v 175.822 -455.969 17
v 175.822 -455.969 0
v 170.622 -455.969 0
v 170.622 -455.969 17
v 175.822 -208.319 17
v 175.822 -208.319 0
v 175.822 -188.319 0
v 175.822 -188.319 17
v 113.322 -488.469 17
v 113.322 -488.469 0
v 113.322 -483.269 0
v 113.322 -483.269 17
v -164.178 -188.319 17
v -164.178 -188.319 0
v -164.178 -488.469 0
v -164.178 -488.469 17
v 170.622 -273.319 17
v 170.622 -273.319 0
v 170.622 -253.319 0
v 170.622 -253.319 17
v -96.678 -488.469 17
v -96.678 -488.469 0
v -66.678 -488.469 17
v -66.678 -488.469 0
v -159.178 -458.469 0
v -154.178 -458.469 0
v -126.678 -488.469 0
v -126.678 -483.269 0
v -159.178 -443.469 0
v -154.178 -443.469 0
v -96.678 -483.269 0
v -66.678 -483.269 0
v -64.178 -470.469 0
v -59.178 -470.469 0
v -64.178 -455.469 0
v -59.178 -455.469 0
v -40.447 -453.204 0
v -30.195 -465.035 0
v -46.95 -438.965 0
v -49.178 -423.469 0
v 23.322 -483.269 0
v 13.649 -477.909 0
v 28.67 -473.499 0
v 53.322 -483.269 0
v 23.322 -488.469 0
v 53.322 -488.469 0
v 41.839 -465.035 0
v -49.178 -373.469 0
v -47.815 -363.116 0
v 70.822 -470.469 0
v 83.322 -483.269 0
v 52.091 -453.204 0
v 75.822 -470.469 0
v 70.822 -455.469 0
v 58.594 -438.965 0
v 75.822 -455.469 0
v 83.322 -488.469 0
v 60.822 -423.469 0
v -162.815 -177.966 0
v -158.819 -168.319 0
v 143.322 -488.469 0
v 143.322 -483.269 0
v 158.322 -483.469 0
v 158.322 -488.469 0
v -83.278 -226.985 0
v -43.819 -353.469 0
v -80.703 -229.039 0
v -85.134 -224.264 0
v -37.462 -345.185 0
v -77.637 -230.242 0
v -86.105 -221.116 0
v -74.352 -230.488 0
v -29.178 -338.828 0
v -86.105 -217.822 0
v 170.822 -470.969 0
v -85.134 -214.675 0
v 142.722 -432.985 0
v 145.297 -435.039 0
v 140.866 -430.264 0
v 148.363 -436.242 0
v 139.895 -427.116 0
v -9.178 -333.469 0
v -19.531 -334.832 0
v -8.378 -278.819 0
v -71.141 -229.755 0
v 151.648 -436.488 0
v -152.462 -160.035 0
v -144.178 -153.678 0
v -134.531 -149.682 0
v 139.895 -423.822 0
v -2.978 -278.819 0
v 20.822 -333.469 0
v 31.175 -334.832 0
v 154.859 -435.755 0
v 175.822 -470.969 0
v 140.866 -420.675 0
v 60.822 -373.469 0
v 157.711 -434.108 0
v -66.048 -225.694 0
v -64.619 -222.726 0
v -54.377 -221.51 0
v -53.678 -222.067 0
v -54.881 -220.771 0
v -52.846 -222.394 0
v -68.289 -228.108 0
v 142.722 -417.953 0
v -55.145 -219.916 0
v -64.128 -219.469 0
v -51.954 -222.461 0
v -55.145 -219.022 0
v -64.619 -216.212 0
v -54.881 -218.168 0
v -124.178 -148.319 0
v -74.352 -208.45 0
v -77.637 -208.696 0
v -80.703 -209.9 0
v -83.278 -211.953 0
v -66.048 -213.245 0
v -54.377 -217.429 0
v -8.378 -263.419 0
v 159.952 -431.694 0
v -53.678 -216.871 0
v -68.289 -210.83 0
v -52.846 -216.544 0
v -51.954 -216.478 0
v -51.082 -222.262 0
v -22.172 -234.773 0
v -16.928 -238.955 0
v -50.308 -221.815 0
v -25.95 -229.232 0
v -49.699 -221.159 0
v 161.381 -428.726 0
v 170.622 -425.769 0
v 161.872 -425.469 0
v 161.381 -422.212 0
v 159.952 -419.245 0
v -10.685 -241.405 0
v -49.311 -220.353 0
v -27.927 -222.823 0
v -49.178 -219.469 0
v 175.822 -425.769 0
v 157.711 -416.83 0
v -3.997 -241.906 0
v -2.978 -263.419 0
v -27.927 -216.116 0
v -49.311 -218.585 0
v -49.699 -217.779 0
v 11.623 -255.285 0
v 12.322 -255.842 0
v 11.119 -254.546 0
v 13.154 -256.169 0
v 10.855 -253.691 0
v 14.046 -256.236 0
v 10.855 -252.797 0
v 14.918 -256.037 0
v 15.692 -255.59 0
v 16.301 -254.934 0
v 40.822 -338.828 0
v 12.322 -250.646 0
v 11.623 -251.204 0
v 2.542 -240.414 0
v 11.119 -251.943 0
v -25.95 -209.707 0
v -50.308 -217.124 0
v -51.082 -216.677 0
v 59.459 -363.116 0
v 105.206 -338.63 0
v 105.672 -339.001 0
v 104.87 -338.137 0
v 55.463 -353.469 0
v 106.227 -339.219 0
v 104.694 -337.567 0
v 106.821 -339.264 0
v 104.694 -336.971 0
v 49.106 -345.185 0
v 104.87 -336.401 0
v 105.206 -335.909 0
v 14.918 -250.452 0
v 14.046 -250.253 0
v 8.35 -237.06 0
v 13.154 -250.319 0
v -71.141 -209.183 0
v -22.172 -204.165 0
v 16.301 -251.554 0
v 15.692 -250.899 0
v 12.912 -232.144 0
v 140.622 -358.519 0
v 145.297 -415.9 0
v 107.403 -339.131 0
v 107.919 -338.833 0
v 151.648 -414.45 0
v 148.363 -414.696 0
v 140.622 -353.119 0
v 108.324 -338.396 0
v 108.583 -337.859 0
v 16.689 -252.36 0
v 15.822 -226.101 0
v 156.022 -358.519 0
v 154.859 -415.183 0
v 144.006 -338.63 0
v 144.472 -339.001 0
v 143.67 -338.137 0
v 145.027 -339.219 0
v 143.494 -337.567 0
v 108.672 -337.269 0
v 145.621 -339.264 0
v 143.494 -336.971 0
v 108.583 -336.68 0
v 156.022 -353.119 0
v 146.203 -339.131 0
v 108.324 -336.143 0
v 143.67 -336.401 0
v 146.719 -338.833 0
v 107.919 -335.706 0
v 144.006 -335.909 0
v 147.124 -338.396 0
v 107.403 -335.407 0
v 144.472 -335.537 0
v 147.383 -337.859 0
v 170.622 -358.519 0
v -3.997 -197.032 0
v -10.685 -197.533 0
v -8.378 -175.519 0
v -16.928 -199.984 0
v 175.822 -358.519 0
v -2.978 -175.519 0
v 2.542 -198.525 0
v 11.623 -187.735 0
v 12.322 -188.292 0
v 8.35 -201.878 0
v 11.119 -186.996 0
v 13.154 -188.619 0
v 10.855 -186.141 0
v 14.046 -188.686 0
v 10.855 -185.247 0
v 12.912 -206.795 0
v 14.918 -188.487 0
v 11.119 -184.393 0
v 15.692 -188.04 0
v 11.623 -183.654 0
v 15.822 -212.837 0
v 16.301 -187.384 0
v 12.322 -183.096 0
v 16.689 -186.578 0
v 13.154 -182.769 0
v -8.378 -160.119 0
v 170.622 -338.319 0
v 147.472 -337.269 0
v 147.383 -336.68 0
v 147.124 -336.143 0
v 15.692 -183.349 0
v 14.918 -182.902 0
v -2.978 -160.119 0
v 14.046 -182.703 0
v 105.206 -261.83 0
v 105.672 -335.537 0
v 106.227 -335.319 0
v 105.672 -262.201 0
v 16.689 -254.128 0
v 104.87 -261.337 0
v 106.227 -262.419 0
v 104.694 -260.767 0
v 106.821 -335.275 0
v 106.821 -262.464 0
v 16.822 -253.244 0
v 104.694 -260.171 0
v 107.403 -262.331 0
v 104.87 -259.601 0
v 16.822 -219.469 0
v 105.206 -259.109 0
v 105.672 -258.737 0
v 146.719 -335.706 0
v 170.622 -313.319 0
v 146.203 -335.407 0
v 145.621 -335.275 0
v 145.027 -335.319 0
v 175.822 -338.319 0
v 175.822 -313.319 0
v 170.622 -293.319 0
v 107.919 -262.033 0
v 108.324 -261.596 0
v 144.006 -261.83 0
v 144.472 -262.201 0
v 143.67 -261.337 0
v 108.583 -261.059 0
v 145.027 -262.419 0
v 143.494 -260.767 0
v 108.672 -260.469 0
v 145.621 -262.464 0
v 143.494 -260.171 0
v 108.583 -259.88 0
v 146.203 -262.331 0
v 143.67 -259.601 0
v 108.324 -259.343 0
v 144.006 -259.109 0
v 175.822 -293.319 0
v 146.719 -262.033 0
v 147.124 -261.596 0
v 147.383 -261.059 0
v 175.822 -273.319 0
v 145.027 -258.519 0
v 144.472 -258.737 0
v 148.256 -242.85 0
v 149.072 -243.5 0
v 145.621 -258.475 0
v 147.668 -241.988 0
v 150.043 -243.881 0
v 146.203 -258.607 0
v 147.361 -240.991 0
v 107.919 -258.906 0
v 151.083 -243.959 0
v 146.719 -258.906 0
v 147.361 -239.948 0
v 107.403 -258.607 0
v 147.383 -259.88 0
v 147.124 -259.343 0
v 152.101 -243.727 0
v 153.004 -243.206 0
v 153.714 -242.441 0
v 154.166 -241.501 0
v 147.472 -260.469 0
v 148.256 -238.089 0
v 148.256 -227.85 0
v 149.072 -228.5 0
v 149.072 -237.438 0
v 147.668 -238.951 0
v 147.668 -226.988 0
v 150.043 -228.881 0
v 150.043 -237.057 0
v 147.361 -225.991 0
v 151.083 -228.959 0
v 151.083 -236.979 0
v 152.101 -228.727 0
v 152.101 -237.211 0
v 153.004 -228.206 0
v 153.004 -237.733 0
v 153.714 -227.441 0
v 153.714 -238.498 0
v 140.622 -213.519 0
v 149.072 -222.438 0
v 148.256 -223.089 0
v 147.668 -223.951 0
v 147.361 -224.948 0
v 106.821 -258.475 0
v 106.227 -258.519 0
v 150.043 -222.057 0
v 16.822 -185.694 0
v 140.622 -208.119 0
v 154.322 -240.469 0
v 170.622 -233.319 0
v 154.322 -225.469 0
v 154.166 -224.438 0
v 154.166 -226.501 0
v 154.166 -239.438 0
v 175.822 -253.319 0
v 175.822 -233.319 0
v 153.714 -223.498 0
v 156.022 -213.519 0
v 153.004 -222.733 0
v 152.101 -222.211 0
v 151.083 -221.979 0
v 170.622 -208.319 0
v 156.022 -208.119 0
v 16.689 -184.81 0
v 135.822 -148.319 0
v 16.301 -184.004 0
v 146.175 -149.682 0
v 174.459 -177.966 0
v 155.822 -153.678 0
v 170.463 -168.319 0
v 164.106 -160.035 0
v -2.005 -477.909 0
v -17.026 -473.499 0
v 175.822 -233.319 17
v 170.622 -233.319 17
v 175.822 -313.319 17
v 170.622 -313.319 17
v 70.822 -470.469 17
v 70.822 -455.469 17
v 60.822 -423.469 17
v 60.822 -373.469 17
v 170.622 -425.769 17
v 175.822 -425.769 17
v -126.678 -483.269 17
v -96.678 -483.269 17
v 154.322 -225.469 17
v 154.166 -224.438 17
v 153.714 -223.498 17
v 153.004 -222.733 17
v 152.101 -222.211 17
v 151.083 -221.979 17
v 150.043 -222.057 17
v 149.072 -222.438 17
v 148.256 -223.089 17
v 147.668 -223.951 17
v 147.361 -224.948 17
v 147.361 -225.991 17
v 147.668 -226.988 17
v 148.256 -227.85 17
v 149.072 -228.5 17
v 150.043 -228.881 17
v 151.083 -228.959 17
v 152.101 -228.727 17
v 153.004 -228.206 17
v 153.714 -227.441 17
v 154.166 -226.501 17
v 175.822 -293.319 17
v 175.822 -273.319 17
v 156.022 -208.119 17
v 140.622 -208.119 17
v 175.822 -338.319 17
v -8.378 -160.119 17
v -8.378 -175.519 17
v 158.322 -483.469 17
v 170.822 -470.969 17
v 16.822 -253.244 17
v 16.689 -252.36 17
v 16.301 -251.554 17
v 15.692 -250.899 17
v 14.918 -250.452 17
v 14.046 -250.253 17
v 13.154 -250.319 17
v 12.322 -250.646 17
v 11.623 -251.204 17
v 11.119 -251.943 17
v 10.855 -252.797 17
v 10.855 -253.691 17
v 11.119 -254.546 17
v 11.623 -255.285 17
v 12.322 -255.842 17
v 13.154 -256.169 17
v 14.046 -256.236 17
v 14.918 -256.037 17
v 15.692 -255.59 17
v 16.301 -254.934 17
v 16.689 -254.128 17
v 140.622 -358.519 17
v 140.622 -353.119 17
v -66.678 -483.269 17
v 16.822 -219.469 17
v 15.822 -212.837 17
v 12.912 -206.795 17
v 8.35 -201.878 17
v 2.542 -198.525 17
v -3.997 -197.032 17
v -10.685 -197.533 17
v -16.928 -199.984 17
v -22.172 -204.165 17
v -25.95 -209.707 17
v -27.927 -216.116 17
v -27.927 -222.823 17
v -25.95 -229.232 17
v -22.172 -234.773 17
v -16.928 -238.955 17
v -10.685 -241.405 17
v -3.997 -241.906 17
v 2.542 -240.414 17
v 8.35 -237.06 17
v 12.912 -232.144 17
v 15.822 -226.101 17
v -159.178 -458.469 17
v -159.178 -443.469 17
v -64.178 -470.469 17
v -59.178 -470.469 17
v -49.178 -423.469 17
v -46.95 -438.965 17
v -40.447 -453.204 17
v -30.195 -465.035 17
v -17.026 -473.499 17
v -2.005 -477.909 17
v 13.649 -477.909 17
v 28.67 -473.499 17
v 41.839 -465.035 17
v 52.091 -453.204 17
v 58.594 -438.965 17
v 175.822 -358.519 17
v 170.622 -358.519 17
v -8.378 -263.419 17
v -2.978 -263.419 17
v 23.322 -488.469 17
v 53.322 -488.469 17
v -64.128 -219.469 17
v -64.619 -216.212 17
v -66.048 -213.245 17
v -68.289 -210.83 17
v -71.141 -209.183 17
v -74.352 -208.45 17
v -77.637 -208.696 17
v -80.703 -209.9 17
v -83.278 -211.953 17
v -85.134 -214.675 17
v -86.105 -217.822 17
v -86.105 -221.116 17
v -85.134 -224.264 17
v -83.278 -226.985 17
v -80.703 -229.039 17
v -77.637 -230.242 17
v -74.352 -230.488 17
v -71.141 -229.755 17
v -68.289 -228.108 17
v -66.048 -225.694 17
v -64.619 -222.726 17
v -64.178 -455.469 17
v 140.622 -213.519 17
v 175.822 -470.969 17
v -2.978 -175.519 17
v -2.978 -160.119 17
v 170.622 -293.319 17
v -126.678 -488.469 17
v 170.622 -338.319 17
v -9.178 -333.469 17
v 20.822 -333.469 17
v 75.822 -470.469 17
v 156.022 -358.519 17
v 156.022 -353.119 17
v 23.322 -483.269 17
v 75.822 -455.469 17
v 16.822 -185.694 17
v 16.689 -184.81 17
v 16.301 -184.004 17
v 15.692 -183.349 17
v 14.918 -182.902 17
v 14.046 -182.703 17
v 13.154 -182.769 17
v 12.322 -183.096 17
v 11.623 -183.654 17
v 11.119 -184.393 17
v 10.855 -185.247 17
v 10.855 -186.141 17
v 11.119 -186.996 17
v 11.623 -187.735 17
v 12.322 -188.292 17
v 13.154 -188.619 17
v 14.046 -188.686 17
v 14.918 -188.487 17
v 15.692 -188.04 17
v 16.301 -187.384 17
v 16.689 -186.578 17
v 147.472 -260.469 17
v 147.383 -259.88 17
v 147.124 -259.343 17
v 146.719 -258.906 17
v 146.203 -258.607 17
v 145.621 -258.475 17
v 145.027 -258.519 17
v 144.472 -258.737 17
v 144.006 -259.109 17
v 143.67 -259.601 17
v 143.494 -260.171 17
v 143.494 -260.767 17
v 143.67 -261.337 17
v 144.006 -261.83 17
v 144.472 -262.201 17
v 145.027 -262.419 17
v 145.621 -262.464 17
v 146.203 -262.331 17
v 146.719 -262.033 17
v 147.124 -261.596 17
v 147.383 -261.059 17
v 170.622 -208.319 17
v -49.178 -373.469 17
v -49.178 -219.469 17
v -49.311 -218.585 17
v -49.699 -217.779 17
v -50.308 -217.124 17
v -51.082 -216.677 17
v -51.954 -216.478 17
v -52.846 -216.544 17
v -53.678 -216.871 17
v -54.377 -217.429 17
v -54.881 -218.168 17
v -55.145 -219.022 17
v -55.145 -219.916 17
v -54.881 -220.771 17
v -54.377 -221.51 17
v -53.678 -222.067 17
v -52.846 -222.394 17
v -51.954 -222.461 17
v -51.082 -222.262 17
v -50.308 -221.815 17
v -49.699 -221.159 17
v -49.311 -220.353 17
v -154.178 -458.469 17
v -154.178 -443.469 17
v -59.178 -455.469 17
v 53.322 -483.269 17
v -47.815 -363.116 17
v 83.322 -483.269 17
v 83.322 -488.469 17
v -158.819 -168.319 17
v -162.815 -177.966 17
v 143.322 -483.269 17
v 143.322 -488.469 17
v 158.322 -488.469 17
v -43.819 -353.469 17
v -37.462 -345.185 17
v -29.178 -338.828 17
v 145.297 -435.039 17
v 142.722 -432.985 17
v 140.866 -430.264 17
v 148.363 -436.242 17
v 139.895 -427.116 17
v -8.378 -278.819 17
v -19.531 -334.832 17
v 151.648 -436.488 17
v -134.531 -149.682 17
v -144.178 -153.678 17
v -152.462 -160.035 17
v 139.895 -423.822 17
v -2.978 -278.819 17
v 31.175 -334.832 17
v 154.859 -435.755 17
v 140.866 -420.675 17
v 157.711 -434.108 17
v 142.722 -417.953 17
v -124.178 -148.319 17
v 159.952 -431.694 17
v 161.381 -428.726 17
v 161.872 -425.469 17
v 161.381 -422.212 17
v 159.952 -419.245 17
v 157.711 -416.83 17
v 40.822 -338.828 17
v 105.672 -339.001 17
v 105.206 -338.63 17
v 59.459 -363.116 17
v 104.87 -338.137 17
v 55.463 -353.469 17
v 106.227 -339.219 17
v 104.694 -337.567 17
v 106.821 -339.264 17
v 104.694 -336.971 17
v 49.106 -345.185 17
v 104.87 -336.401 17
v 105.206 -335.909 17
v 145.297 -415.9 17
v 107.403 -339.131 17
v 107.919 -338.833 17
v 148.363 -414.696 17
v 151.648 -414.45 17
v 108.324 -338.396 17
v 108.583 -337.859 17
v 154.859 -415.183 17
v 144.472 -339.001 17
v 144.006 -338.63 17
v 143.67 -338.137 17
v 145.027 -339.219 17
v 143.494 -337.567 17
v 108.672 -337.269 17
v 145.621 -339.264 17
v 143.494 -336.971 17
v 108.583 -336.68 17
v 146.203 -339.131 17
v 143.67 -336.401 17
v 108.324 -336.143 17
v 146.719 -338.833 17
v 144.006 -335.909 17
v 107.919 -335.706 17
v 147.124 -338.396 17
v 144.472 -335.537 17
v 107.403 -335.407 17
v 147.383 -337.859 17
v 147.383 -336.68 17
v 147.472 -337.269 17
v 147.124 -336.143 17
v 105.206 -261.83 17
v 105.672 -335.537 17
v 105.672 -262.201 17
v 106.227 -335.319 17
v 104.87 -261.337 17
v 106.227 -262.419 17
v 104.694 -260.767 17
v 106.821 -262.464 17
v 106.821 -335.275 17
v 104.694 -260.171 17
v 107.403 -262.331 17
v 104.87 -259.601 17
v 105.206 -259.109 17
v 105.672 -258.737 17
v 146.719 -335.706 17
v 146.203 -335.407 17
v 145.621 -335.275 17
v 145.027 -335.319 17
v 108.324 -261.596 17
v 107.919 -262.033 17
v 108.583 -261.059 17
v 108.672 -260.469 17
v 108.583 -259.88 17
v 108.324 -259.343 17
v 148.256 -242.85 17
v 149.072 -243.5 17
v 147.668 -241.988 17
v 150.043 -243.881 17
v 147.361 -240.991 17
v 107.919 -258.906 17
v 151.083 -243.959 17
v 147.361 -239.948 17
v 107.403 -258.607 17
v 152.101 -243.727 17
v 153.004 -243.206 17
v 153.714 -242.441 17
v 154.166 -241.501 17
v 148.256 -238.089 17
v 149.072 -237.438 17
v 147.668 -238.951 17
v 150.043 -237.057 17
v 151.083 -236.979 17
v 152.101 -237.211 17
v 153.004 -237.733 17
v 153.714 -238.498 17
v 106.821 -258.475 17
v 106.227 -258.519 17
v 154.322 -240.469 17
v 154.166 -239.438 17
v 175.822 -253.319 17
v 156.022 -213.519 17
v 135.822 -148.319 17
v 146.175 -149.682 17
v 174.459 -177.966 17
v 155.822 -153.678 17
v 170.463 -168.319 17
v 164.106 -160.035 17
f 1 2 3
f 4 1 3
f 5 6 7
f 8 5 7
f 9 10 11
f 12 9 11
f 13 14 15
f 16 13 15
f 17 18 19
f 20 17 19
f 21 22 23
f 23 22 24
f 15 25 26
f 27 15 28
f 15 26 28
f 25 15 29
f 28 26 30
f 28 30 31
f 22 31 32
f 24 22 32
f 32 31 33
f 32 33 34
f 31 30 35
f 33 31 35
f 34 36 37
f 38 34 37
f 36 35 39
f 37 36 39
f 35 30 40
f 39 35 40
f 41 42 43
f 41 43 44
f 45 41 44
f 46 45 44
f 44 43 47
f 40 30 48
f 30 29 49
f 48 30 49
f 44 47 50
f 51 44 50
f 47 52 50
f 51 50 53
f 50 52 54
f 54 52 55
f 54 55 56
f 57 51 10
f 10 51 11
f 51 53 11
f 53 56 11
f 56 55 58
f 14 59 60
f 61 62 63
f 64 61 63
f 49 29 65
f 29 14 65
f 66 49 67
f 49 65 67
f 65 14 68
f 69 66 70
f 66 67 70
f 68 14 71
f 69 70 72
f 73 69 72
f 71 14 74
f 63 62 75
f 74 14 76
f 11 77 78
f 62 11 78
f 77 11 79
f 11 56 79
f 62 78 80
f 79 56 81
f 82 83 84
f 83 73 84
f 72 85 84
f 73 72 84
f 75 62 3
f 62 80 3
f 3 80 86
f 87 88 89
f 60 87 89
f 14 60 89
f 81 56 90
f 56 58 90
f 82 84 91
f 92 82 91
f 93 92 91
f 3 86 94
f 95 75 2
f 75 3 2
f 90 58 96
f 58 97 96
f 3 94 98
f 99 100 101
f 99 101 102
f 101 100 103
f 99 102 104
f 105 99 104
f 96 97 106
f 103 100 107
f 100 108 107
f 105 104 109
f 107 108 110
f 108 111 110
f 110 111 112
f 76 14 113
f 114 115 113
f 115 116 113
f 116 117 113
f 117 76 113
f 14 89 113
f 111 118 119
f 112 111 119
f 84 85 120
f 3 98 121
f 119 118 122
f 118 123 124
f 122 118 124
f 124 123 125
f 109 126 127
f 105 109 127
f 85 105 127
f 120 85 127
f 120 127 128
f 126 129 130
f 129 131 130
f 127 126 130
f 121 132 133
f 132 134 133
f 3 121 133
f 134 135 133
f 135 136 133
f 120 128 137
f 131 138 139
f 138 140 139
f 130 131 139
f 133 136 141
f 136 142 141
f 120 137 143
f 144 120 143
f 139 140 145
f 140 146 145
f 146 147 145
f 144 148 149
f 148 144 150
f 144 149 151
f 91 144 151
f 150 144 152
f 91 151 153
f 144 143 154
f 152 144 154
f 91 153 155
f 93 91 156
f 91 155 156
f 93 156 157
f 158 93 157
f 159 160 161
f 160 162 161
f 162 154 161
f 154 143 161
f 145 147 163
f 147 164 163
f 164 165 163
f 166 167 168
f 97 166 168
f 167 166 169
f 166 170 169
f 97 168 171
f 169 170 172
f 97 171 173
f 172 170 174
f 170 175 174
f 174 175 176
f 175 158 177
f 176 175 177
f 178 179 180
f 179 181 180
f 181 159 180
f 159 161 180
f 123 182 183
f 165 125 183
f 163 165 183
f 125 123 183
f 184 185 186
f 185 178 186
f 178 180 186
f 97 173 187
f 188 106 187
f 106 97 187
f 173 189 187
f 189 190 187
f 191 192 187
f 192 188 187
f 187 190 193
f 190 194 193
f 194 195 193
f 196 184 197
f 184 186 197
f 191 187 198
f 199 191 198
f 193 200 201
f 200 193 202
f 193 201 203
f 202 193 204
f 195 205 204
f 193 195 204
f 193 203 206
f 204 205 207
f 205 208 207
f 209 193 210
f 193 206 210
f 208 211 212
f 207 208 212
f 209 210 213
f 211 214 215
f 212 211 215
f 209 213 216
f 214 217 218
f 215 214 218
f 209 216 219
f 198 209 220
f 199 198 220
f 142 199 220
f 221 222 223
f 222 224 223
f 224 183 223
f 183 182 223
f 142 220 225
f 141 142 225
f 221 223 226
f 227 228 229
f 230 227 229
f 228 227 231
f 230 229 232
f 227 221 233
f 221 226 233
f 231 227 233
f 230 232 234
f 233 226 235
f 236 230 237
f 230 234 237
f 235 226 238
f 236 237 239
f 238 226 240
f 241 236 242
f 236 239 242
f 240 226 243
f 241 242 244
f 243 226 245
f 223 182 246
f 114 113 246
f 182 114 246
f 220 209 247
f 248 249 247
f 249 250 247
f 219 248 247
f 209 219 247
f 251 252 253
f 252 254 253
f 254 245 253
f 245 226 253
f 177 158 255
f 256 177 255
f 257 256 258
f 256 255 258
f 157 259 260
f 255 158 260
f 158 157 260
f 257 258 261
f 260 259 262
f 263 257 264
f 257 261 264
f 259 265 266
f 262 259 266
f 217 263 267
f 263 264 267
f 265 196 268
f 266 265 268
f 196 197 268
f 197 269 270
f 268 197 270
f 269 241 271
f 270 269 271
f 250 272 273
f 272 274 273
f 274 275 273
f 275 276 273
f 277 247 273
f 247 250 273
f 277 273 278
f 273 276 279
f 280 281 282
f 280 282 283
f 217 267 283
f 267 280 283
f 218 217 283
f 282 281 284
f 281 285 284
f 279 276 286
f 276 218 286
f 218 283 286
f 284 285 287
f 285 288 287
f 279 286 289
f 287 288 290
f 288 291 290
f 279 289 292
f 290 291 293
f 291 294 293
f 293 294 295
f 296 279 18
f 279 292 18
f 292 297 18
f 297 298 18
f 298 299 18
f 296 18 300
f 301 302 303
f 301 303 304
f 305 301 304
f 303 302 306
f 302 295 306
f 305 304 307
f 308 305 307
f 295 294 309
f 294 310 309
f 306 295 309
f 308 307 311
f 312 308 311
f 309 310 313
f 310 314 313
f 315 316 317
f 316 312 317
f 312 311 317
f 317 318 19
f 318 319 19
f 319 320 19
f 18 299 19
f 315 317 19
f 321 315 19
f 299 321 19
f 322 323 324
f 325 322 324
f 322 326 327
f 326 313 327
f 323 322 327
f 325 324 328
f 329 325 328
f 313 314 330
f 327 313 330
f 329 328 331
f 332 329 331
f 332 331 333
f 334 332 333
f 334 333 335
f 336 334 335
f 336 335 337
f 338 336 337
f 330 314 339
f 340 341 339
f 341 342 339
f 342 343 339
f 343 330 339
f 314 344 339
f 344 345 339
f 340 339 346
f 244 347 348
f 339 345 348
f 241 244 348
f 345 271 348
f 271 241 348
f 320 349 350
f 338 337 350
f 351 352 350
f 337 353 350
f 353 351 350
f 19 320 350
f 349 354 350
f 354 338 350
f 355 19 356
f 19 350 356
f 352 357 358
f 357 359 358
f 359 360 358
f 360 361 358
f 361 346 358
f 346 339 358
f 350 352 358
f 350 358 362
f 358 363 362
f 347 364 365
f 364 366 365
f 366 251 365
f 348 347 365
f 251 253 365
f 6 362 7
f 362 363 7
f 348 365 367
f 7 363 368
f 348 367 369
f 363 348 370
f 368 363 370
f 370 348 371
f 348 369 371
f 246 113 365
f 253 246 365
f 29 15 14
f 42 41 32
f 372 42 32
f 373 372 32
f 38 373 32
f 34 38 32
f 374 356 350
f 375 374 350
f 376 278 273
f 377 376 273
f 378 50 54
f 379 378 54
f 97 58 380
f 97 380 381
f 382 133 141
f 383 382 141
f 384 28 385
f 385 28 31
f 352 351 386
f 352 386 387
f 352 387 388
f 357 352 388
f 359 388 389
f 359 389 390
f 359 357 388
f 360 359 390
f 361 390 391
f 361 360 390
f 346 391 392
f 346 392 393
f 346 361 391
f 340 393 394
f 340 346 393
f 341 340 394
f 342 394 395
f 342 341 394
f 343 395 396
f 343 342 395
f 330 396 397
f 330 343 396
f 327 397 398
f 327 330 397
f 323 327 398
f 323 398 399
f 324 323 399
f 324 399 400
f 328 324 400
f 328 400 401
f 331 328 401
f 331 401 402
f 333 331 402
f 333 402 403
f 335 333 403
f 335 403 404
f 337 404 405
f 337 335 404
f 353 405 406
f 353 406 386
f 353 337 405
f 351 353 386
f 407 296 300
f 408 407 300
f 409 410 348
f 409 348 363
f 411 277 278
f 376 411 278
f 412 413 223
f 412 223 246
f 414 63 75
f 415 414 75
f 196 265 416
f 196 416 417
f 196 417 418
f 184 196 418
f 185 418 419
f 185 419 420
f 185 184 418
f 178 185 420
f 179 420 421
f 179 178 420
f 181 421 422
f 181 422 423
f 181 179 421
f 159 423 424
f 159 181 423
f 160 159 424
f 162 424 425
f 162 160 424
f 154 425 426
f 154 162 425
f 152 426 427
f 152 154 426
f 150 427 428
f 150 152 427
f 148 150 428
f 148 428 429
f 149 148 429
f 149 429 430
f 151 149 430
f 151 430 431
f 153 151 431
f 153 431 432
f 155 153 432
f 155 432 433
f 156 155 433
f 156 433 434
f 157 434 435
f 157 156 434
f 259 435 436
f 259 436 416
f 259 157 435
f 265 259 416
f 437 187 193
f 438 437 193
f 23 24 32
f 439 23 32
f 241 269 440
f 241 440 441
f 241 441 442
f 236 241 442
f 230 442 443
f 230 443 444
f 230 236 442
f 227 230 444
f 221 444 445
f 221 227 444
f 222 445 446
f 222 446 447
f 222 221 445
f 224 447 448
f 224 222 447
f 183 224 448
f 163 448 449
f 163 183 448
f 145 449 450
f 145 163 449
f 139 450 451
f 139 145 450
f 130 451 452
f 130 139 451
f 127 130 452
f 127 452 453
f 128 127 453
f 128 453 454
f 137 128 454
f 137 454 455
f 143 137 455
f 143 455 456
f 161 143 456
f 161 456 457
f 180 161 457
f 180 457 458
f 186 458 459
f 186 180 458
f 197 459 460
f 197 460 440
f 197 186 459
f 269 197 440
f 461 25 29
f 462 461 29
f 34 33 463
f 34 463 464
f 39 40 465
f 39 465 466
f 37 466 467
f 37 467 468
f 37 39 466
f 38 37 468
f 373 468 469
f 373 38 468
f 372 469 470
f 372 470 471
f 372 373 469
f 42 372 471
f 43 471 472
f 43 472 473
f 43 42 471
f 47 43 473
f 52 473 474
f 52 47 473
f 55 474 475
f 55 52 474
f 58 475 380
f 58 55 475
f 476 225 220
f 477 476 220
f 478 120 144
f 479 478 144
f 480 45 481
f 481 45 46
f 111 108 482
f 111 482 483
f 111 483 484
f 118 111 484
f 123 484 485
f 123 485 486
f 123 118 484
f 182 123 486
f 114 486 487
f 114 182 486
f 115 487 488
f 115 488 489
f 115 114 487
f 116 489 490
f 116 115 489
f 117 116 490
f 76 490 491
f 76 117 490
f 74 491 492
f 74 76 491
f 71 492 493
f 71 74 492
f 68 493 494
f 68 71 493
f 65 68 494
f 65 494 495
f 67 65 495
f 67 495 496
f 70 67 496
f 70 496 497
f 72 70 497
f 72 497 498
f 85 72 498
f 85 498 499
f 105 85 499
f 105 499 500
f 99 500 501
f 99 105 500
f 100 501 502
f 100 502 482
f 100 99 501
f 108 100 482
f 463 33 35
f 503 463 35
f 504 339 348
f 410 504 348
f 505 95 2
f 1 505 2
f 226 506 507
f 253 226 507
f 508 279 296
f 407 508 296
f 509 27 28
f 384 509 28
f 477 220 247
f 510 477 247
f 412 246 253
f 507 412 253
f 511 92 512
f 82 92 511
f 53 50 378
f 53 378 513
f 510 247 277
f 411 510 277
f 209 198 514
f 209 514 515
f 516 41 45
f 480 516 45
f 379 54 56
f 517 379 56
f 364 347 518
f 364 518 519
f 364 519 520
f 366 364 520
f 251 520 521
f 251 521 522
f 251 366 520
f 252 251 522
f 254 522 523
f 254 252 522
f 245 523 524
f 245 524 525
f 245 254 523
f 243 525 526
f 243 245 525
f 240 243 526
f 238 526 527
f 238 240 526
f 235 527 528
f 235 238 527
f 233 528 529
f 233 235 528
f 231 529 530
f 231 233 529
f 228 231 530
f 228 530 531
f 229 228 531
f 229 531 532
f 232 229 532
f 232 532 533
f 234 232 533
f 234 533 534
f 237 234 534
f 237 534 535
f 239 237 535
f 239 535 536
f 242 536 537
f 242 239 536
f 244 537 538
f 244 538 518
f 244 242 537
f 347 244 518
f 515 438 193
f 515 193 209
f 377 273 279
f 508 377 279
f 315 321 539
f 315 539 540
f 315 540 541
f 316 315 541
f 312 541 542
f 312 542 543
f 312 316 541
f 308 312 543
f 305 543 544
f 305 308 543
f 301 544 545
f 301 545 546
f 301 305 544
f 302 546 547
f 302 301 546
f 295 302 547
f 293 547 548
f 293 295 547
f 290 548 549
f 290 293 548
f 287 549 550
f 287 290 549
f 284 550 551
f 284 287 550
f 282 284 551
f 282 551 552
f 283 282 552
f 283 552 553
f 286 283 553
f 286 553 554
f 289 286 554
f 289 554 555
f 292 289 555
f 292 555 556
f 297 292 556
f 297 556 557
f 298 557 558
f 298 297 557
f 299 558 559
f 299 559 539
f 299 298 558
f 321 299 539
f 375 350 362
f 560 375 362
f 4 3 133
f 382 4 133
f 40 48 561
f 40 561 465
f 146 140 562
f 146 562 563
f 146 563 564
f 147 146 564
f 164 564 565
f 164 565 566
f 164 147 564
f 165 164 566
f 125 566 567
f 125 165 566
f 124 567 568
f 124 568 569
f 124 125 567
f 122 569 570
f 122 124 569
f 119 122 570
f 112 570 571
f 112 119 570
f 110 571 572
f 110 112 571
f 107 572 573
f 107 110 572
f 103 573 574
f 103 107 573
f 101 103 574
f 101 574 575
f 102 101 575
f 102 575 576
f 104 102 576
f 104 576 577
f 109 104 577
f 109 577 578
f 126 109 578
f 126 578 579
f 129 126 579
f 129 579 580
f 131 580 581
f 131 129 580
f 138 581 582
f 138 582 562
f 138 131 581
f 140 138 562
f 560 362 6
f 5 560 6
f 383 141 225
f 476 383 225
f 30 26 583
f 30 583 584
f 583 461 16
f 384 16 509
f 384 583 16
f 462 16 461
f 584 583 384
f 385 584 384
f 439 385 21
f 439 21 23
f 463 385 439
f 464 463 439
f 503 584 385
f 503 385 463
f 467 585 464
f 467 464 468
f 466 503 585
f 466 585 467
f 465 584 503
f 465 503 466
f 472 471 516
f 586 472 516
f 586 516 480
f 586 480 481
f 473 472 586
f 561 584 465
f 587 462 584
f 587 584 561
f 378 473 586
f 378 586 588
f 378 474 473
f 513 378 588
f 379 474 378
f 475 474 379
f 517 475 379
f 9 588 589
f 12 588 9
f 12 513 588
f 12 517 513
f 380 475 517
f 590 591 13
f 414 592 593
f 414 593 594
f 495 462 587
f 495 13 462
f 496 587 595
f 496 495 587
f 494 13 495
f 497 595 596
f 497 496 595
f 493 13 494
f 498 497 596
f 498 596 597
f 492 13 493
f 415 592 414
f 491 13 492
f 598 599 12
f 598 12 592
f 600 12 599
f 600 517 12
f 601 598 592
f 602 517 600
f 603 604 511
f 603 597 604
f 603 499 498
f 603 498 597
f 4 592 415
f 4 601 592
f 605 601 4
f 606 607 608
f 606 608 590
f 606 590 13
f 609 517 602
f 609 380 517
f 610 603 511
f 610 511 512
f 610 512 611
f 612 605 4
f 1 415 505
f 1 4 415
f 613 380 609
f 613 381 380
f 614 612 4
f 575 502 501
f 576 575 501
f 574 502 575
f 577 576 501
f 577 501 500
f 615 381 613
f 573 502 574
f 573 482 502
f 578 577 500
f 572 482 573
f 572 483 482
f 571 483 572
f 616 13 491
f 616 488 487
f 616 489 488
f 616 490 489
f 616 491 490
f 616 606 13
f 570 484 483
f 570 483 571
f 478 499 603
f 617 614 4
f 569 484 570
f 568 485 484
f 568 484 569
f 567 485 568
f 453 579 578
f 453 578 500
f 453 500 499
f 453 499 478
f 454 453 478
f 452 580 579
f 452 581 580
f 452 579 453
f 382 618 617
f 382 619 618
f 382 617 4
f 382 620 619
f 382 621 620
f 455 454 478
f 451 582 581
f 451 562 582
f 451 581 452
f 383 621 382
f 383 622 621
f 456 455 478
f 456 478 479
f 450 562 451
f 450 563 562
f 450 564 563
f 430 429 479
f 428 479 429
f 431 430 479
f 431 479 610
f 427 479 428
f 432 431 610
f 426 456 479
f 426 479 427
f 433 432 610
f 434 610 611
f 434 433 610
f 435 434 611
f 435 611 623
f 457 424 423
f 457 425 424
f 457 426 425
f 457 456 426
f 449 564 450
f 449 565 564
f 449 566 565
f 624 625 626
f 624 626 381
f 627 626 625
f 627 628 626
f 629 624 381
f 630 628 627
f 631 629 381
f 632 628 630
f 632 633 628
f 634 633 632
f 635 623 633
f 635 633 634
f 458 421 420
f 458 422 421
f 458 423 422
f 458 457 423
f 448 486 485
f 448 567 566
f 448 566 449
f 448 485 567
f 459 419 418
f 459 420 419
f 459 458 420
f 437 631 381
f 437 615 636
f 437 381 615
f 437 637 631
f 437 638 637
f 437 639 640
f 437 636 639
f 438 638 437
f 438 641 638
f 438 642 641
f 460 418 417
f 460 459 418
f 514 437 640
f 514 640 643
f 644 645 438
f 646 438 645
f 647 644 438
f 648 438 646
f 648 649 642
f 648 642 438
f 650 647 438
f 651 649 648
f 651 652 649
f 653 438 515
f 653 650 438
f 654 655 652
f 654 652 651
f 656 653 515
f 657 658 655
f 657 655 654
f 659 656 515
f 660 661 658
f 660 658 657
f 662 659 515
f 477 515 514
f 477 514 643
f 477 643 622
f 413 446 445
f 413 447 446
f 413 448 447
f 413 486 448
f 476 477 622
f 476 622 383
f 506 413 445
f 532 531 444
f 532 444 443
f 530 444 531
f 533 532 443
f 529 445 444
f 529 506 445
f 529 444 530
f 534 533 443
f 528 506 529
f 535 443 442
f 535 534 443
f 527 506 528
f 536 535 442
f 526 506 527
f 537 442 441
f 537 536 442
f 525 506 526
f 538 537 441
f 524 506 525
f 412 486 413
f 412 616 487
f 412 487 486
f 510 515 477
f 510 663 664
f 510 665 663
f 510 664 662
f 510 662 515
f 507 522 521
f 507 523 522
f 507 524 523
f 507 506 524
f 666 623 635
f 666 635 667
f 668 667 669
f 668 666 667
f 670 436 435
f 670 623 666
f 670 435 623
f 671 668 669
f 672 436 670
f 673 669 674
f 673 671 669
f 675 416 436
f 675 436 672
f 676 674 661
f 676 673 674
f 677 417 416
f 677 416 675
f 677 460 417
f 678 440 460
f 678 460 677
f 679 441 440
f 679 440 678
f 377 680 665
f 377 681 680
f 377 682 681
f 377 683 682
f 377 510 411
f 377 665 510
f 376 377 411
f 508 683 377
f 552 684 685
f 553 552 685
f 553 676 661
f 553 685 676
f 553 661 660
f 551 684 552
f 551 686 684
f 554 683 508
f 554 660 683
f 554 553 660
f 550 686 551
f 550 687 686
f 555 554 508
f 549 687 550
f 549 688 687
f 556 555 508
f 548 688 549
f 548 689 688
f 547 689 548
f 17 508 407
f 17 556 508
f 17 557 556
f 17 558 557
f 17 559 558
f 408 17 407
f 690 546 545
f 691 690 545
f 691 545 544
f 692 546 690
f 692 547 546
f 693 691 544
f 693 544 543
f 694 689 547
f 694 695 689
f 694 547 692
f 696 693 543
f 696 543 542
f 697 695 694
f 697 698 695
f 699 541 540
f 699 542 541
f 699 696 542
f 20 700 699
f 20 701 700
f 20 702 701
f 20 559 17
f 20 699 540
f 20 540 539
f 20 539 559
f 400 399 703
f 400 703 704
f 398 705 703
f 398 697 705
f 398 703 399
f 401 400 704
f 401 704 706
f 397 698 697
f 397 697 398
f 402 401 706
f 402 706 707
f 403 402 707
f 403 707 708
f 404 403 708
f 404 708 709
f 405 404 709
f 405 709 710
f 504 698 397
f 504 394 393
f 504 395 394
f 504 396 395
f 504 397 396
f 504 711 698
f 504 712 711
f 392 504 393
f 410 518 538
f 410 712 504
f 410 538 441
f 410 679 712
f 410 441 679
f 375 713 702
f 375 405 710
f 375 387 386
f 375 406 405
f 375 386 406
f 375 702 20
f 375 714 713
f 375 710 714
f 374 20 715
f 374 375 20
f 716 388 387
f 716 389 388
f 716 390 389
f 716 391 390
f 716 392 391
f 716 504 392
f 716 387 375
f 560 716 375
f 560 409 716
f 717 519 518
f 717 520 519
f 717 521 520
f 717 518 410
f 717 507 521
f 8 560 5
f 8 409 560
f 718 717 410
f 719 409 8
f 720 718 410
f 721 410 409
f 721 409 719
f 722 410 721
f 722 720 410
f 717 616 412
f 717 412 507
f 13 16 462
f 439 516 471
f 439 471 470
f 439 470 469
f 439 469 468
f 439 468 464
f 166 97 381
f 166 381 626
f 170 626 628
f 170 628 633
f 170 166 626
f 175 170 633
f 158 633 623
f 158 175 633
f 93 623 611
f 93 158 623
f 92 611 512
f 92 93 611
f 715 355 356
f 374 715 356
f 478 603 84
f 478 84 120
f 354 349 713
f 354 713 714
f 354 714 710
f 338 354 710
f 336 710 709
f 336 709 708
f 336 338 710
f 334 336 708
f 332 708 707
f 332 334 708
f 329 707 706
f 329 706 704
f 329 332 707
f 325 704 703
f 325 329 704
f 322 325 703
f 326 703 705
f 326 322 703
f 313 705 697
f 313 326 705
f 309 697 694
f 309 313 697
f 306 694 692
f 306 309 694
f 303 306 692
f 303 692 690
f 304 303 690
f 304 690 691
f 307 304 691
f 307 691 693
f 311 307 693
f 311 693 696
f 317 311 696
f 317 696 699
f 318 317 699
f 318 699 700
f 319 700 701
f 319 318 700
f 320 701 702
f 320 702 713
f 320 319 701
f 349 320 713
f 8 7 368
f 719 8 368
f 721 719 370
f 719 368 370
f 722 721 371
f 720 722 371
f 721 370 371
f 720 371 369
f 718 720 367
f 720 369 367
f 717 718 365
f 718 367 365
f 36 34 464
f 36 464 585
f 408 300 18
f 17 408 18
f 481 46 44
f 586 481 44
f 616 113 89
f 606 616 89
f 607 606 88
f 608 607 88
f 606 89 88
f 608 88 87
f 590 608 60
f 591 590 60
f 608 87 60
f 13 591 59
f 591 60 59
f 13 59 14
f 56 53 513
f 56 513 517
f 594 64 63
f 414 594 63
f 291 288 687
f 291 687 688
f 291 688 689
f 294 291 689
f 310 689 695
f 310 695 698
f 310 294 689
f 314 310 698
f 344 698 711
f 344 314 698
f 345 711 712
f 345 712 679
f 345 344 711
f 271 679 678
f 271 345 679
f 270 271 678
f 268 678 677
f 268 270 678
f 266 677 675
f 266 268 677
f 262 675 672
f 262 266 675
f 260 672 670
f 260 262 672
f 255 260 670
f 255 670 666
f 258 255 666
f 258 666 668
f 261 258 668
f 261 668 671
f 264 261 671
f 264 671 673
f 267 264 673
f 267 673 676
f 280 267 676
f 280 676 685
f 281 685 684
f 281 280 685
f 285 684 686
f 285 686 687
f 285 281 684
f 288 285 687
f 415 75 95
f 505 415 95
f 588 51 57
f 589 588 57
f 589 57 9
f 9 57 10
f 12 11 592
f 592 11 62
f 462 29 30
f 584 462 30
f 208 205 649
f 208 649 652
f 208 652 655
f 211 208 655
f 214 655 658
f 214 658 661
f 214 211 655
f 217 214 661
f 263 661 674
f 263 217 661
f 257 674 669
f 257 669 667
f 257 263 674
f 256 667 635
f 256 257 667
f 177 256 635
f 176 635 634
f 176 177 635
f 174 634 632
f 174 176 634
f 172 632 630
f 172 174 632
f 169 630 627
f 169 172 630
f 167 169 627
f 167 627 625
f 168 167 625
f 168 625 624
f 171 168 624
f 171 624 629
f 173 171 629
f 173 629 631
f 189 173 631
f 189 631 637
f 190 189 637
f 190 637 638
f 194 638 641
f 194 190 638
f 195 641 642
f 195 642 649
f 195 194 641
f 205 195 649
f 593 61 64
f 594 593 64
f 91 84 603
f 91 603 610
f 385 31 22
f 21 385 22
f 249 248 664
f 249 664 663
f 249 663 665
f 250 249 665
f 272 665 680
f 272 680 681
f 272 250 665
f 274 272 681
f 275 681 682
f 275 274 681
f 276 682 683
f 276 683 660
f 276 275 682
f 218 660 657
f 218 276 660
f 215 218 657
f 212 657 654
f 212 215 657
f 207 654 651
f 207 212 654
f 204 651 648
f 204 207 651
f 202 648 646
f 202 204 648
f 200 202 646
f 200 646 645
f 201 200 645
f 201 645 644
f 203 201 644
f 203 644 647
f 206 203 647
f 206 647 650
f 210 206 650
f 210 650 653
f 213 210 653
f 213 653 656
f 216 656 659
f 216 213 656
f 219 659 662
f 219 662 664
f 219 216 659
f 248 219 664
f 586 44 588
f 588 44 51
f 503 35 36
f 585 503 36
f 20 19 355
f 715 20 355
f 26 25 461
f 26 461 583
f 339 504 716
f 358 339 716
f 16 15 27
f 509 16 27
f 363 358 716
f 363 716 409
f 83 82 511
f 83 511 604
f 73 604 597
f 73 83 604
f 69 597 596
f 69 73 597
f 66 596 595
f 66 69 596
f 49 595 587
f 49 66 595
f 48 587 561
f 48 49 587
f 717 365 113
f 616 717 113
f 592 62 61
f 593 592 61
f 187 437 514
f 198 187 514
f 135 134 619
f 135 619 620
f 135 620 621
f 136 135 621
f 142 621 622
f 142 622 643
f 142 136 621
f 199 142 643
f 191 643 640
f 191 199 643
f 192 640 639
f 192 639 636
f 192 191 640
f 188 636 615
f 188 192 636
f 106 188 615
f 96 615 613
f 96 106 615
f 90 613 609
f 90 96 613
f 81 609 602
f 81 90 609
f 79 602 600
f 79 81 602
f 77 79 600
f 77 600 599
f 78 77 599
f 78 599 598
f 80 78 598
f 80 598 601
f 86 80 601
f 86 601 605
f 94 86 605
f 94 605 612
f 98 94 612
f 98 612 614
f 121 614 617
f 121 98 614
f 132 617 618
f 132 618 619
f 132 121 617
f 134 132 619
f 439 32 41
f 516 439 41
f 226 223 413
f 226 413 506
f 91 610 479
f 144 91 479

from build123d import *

# Parameters (mm, degrees)
MODEL_R             = 11.05
MODEL_R_2           = 22.5
MODEL_R_3           = 3
MODEL_R_4           = 3.5
MODEL_R_5           = 2
MODEL_W             = 5.4
MODEL_H             = 15.4
MODEL_W_2           = 5
MODEL_H_2           = 15
MODEL_W_3           = 15.4
MODEL_H_3           = 5.4
BOSS_EXTRUDE1_DEPTH = 17


with BuildPart() as part:
    # Model → Boss-Extrude1 (new body)
    with BuildSketch(Plane.XY):
        with BuildLine():
            Line((170.621850122, -313.319218198), (170.621850122, -293.319218198))
            Line((170.621850122, -293.319218198), (175.821850122, -293.319218198))
            Line((175.821850122, -293.319218198), (175.821850122, -273.319218198))
            Line((175.821850122, -273.319218198), (170.621850122, -273.319218198))
            Line((170.621850122, -273.319218198), (170.621850122, -253.319218198))
            Line((170.621850122, -253.319218198), (175.821850122, -253.319218198))
            Line((175.821850122, -253.319218198), (175.821850122, -233.319218198))
            Line((175.821850122, -233.319218198), (170.621850122, -233.319218198))
            Line((170.621850122, -233.319218198), (170.621850122, -208.319218198))
            Line((170.621850122, -208.319218198), (175.821850122, -208.319218198))
            Line((175.821850122, -208.319218198), (175.821850122, -188.319218198))
            ThreePointArc((175.821850122, -188.319218198), (164.106121369, -160.034946951), (135.821850122, -148.319218198))
            Line((135.821850122, -148.319218198), (-124.178149879, -148.319218198))
            ThreePointArc((-124.178149879, -148.319218198), (-152.462421126, -160.034946951), (-164.178149878, -188.319218198))
            Line((-164.178149878, -188.319218198), (-164.178149878, -488.469218198))
            Line((-164.178149878, -488.469218198), (-126.678149879, -488.469218198))
            Line((-126.678149879, -488.469218198), (-126.678149879, -483.269218198))
            Line((-126.678149879, -483.269218198), (-96.678149879, -483.269218198))
            Line((-96.678149879, -483.269218198), (-96.678149879, -488.469218198))
            Line((-96.678149879, -488.469218198), (-66.678149879, -488.469218198))
            Line((-66.678149879, -488.469218198), (-66.678149879, -483.269218198))
            Line((-66.678149879, -483.269218198), (23.321850122, -483.269218198))
            Line((23.321850122, -483.269218198), (23.321850122, -488.469218198))
            Line((23.321850122, -488.469218198), (53.321850122, -488.469218198))
            Line((53.321850122, -488.469218198), (53.321850122, -483.269218198))
            Line((53.321850122, -483.269218198), (83.321850122, -483.269218198))
            Line((83.321850122, -483.269218198), (83.321850122, -488.469218198))
            Line((83.321850122, -488.469218198), (113.321850122, -488.469218198))
            Line((113.321850122, -488.469218198), (113.321850122, -483.269218198))
            Line((113.321850122, -483.269218198), (143.321850122, -483.269218198))
            Line((143.321850122, -483.269218198), (143.321850122, -488.469218198))
            Line((143.321850122, -488.469218198), (158.321850122, -488.469218198))
            Line((158.321850122, -488.469218198), (158.321850122, -483.469218198))
            Line((158.321850122, -483.469218198), (170.821850122, -470.969218198))
            Line((170.821850122, -470.969218198), (175.821850122, -470.969218198))
            Line((175.821850122, -470.969218198), (175.821850122, -455.969218198))
            Line((175.821850122, -455.969218198), (170.621850122, -455.969218198))
            Line((170.621850122, -455.969218198), (170.621850122, -425.769218198))
            Line((170.621850122, -425.769218198), (175.821850122, -425.769218198))
            Line((175.821850122, -425.769218198), (175.821850122, -358.519218198))
            Line((175.821850122, -358.519218198), (170.621850122, -358.519218198))
            Line((170.621850122, -358.519218198), (170.621850122, -338.319218198))
            Line((170.621850122, -338.319218198), (175.821850122, -338.319218198))
            Line((175.821850122, -338.319218198), (175.821850122, -313.319218198))
            Line((175.821850122, -313.319218198), (170.621850122, -313.319218198))
        make_face()
        with Locations((-75.178149879, -219.469218198)):
            Circle(MODEL_R, mode=Mode.SUBTRACT)
        with Locations((150.821850122, -425.469218198)):
            Circle(MODEL_R, mode=Mode.SUBTRACT)
        with Locations((-5.678149878, -219.469218198)):
            Circle(MODEL_R_2, mode=Mode.SUBTRACT)
        with Locations((13.821850122, -253.244208946)):
            Circle(MODEL_R_3, mode=Mode.SUBTRACT)
        with Locations((13.821850122, -185.69422745)):
            Circle(MODEL_R_3, mode=Mode.SUBTRACT)
        with Locations((-52.178149879, -219.469218198)):
            Circle(MODEL_R_3, mode=Mode.SUBTRACT)
        with Locations((150.821850122, -240.469218198)):
            Circle(MODEL_R_4, mode=Mode.SUBTRACT)
        with Locations((150.821850122, -225.469218198)):
            Circle(MODEL_R_4, mode=Mode.SUBTRACT)
        with Locations((106.671850121, -337.269218198)):
            Circle(MODEL_R_5, mode=Mode.SUBTRACT)
        with Locations((145.471850121, -260.469218198)):
            Circle(MODEL_R_5, mode=Mode.SUBTRACT)
        with Locations((145.471850121, -337.269218198)):
            Circle(MODEL_R_5, mode=Mode.SUBTRACT)
        with Locations((106.671850121, -260.469218198)):
            Circle(MODEL_R_5, mode=Mode.SUBTRACT)
        with BuildLine():
            Line((-49.178149879, -373.469218198), (-49.178149878, -423.469218198))
            ThreePointArc((-49.178149878, -423.469218198), (5.821850122, -478.469218198), (60.821850122, -423.469218198))
            Line((60.821850122, -423.469218198), (60.821850122, -373.469218198))
            ThreePointArc((60.821850122, -373.469218198), (49.106121369, -345.184946951), (20.821850122, -333.469218198))
            Line((20.821850122, -333.469218198), (-9.178149878, -333.469218198))
            ThreePointArc((-9.178149878, -333.469218198), (-37.462421126, -345.184946951), (-49.178149879, -373.469218198))
        make_face(mode=Mode.SUBTRACT)
        with Locations((-5.678149879, -167.819218198)):
            Rectangle(MODEL_W, MODEL_H, mode=Mode.SUBTRACT)
        with Locations((-5.678149879, -271.119218198)):
            Rectangle(MODEL_W, MODEL_H, mode=Mode.SUBTRACT)
        with Locations((73.321850122, -462.969218198)):
            Rectangle(MODEL_W_2, MODEL_H_2, mode=Mode.SUBTRACT)
        with Locations((148.321850122, -210.819218198)):
            Rectangle(MODEL_W_3, MODEL_H_3, mode=Mode.SUBTRACT)
        with Locations((148.321850122, -355.819218198)):
            Rectangle(MODEL_W_3, MODEL_H_3, mode=Mode.SUBTRACT)
        with Locations((-156.678149878, -450.969218198)):
            Rectangle(MODEL_W_2, MODEL_H_2, mode=Mode.SUBTRACT)
        with Locations((-61.678149878, -462.969218198)):
            Rectangle(MODEL_W_2, MODEL_H_2, mode=Mode.SUBTRACT)
    extrude(amount=BOSS_EXTRUDE1_DEPTH)


solid = part.part
